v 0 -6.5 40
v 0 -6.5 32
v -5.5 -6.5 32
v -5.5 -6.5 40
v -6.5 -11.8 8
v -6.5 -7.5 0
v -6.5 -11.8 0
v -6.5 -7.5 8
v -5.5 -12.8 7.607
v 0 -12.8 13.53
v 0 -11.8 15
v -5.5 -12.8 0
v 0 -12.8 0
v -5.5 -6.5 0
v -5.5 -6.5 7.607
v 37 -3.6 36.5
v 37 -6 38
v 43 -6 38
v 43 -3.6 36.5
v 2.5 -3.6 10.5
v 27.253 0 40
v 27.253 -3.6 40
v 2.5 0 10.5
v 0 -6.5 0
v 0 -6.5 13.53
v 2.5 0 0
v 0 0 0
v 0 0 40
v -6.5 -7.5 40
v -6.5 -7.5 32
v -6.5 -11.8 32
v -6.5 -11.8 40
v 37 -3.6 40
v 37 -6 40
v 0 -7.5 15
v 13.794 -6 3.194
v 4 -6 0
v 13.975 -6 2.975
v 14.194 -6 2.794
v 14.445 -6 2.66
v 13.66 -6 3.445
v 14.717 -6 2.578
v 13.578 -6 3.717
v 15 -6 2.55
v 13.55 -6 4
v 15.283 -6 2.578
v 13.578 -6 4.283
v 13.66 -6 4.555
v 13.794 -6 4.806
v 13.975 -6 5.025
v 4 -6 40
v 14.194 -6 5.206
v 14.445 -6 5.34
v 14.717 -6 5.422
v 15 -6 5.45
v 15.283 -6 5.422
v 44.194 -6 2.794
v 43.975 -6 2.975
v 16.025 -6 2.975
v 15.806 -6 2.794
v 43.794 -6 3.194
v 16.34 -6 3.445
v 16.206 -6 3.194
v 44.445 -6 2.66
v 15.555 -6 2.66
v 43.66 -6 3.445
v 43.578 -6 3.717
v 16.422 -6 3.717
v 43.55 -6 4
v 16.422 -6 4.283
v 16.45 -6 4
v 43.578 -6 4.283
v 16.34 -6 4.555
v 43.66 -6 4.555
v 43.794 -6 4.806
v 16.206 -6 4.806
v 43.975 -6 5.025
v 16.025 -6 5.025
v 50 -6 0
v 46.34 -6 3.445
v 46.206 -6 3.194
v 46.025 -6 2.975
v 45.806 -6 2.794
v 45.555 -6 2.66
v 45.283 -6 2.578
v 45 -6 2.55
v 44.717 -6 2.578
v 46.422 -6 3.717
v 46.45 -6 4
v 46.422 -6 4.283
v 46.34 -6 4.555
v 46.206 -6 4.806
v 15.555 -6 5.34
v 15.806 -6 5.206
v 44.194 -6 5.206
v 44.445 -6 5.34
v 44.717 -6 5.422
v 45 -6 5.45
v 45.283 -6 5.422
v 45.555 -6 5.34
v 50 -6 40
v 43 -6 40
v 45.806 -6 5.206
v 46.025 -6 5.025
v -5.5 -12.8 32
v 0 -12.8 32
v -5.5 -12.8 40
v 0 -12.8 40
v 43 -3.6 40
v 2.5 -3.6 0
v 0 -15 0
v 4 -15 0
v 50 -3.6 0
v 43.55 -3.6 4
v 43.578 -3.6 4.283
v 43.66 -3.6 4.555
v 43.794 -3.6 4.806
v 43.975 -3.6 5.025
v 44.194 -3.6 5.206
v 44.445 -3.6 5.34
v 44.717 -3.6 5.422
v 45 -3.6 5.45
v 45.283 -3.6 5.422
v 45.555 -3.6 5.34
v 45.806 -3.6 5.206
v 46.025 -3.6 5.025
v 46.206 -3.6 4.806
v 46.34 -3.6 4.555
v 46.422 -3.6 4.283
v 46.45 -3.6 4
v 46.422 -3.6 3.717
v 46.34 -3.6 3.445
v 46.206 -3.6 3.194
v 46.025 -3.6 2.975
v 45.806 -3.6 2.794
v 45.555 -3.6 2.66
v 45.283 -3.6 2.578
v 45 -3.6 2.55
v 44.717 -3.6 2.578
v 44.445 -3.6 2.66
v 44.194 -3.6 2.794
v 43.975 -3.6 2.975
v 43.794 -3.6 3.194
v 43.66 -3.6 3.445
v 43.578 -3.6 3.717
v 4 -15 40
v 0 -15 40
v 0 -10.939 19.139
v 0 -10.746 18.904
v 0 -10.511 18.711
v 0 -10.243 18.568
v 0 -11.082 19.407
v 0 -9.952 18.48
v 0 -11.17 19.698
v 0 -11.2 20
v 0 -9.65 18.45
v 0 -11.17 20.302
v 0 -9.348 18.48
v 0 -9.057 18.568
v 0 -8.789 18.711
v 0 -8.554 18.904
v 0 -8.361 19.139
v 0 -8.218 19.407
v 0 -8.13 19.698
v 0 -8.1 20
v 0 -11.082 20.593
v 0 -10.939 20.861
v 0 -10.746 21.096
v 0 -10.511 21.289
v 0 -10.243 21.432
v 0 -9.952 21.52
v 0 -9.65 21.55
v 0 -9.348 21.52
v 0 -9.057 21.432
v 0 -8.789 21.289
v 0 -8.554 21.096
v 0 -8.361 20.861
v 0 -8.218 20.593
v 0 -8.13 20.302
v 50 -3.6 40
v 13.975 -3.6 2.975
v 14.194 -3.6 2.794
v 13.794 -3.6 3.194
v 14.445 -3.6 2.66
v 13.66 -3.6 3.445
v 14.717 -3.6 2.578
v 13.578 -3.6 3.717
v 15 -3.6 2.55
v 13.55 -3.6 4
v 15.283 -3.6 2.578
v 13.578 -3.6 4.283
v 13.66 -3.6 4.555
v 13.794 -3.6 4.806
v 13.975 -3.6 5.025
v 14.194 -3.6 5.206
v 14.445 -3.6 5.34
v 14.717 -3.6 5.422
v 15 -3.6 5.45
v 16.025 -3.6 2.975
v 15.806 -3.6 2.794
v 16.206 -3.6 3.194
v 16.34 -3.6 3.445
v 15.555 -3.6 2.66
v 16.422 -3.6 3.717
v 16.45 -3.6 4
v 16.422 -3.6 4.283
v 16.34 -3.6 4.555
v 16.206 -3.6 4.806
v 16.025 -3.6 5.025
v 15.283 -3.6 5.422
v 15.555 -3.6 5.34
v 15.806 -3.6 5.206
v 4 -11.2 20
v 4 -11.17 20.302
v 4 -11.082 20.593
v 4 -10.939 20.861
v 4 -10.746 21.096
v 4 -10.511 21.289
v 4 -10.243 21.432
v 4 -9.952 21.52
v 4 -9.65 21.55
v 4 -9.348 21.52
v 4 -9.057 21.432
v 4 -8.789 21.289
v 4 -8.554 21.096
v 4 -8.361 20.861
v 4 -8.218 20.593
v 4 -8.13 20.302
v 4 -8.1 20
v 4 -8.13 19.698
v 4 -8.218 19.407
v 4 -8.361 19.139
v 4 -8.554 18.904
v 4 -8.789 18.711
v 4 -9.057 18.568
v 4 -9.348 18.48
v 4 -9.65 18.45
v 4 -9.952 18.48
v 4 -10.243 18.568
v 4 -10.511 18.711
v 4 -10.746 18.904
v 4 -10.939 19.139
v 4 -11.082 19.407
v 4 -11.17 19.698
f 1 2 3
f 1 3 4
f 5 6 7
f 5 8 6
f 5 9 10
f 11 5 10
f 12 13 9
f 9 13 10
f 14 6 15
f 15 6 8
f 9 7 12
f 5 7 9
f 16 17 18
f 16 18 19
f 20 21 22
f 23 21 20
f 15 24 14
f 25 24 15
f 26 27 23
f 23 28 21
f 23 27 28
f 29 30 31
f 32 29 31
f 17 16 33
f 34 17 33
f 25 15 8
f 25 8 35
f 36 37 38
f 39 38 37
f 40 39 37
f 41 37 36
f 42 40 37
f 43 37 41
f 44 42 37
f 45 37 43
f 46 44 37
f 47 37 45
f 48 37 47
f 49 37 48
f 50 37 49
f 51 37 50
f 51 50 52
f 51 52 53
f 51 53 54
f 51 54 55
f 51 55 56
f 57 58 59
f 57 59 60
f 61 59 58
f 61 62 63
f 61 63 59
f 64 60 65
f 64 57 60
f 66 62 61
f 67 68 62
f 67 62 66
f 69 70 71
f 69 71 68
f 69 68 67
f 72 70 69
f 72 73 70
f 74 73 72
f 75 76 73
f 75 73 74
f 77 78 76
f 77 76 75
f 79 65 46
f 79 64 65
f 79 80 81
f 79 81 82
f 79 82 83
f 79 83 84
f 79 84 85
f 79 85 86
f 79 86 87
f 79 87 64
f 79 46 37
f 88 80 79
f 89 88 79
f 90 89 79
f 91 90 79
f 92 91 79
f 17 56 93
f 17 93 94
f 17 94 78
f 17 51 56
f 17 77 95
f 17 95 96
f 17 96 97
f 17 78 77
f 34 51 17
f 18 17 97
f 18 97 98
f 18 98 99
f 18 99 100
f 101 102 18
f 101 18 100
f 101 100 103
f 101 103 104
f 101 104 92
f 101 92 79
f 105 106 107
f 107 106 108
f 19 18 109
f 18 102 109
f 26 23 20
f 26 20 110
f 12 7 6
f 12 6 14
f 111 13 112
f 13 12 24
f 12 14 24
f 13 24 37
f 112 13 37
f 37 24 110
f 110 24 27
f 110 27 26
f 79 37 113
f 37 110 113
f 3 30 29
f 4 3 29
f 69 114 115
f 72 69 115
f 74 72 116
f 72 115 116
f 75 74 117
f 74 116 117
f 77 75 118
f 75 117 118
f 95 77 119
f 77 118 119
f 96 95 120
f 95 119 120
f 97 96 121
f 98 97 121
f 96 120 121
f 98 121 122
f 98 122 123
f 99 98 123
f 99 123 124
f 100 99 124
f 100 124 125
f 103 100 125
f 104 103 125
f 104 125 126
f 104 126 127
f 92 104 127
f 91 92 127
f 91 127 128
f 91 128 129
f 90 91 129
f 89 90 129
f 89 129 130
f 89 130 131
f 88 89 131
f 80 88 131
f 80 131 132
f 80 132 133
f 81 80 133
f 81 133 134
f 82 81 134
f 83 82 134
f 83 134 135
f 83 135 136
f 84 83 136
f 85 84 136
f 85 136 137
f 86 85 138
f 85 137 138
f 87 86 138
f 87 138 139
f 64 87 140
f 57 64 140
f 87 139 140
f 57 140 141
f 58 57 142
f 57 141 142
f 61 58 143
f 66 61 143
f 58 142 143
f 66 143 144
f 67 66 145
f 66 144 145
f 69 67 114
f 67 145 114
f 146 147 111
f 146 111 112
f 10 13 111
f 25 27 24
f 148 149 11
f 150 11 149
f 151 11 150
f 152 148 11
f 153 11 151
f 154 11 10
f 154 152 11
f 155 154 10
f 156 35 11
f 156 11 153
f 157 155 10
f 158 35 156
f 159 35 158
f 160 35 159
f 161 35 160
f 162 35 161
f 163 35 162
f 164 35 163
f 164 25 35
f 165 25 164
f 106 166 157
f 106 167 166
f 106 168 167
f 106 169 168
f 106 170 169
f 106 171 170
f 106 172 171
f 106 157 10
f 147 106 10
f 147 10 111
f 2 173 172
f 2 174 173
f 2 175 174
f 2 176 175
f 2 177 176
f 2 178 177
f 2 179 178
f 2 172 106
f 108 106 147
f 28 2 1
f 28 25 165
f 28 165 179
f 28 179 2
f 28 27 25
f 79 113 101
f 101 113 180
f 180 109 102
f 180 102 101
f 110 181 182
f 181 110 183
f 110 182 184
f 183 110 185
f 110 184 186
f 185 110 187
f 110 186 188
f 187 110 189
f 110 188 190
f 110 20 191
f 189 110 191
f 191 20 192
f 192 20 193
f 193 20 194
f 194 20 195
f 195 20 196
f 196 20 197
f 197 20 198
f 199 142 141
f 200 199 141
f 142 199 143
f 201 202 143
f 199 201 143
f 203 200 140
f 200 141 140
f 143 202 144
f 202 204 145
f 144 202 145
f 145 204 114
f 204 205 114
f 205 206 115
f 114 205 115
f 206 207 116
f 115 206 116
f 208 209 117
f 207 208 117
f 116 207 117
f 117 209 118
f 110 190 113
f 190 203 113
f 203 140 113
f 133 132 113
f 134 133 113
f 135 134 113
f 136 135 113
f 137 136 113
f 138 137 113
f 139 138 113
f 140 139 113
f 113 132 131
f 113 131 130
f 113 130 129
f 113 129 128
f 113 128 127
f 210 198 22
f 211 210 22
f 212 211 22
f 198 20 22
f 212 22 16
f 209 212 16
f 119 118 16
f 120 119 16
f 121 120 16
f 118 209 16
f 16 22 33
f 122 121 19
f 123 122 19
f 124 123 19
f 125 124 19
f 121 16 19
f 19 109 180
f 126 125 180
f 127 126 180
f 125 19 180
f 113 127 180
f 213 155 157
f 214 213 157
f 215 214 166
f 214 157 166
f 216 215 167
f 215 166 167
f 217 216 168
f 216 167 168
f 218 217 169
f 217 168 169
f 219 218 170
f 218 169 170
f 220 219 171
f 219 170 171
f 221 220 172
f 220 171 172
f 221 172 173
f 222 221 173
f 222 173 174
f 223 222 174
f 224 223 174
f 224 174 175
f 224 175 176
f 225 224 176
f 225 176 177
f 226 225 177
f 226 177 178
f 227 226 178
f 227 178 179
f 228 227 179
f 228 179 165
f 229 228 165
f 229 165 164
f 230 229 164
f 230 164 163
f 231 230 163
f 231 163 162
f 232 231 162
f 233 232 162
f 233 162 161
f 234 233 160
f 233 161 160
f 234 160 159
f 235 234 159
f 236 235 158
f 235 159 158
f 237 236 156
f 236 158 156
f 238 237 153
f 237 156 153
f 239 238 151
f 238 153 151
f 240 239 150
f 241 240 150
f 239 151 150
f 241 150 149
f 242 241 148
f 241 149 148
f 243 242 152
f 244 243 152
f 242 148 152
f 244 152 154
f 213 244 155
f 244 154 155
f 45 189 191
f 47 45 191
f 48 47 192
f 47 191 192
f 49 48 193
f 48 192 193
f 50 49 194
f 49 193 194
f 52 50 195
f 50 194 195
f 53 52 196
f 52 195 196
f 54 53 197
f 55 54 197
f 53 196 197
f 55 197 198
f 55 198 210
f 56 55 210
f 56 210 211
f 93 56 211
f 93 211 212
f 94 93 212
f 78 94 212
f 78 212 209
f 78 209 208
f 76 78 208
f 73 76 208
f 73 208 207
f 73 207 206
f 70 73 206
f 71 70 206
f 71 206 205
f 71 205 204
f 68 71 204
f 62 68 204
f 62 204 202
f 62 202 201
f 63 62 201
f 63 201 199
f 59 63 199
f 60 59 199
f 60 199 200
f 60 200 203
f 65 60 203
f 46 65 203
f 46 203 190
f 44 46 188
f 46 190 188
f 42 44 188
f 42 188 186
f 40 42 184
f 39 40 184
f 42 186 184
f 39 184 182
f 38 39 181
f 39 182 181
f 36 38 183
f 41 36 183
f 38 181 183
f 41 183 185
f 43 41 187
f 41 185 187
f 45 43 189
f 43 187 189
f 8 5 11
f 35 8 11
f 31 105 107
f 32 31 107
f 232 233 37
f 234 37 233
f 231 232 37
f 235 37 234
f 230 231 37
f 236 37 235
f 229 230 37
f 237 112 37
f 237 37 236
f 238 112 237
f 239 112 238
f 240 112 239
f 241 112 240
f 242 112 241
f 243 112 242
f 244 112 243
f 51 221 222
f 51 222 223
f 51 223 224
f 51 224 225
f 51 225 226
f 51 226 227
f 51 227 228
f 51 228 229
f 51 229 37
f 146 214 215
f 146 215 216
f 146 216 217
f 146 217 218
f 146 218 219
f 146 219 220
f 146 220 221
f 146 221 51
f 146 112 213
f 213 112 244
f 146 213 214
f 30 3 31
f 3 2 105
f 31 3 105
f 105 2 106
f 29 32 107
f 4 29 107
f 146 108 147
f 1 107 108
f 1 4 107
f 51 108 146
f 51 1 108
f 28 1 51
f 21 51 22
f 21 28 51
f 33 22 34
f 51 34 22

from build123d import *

# Parameters (mm, degrees)
SKETCH_W        = 50
SKETCH_H        = 40
PAD_DEPTH       = 15
SKETCH001_R     = 1.45
POCKET_DEPTH    = 12
POCKET001_DEPTH = 3.6
SKETCH003_W     = 6
SKETCH003_H     = 2
POCKET002_DEPTH = 15
SKETCH004_W     = 6.3
SKETCH004_H     = 8
PAD001_DEPTH    = 6.5
SKETCH005_W     = 70
SKETCH005_H     = 60
POCKET003_DEPTH = 9
SKETCH006_R     = 1.55
POCKET004_DEPTH = 5
SKETCH018_W     = 3
SKETCH018_H     = 3
POCKET010_DEPTH = 22
POCKET011_DEPTH = 6
PAD007_DEPTH    = 6.3
CHAMFER_SIZE    = 1


with BuildPart() as part:
    # Sketch (on XZ_Plane of Origin) → Pad (new body)
    with BuildSketch(Plane.XZ):
        with Locations((25, 20)):
            Rectangle(SKETCH_W, SKETCH_H)
    extrude(amount=PAD_DEPTH)

    # Sketch001 (on Face5 of Pad) → Pocket (cut)
    with BuildSketch(Plane(origin=(0, 0, 0), x_dir=(-1, 0, 0), z_dir=(0, 1, 0))):
        with Locations((-45, 4)):
            Circle(SKETCH001_R)
        with Locations((-15, 4)):
            Circle(SKETCH001_R)
    extrude(amount=-POCKET_DEPTH, mode=Mode.SUBTRACT)

    # Sketch002 (on Face4 of Pocket) → Pocket001 (cut)
    with BuildSketch(Plane(origin=(0, 0, 0), x_dir=(-1, 0, 0), z_dir=(0, 1, 0))):
        Polygon((-2.5, 0), (-56.5, 0), (-56.5, 40), (-27.253439, 40), (-2.5, 10.5), align=None)
    extrude(amount=-POCKET001_DEPTH, mode=Mode.SUBTRACT)

    # Sketch003 (on Face4 of Pocket001) → Pocket002 (cut)
    with BuildSketch(Plane(origin=(0, 0, 0), x_dir=(-1, 0, 0), z_dir=(0, 1, 0))):
        with Locations((-40, 39)):
            Rectangle(SKETCH003_W, SKETCH003_H)
    extrude(amount=-POCKET002_DEPTH, mode=Mode.SUBTRACT)

    # Sketch004 (on Face1 of Pocket002) → Pad001 (join)
    with BuildSketch(Plane(origin=(0, 0, 0), x_dir=(0, -1, 0), z_dir=(-1, 0, 0))):
        with Locations((9.65, 4)):
            Rectangle(SKETCH004_W, SKETCH004_H)
        with Locations((9.65, 36)):
            Rectangle(SKETCH004_W, SKETCH004_H)
    extrude(amount=PAD001_DEPTH)

    # Sketch005 (on Face6 of Pad001) → Pocket003 (cut)
    with BuildSketch(Plane.XZ.offset(15)):
        with Locations((39, 22)):
            Rectangle(SKETCH005_W, SKETCH005_H)
    extrude(amount=-POCKET003_DEPTH, mode=Mode.SUBTRACT)

    # Sketch006 (on Face1 of Pocket003) → Pocket004 (cut)
    with BuildSketch(Plane(origin=(0, 0, 0), x_dir=(0, -1, 0), z_dir=(-1, 0, 0))):
        with Locations((9.65, 20)):
            Circle(SKETCH006_R)
    extrude(amount=-POCKET004_DEPTH, mode=Mode.SUBTRACT)

    # Sketch018 (on Face21 of Pocket004) → Pocket010 (cut)
    with BuildSketch(Plane.YZ.offset(50)):
        with Locations((-0.3, 38.5)):
            Rectangle(SKETCH018_W, SKETCH018_H)
    extrude(amount=-POCKET010_DEPTH, mode=Mode.SUBTRACT)

    # Sketch019 (on Face15 of Pocket010) → Pocket011 (cut)
    with BuildSketch(Plane.YZ.offset(37)):
        Polygon((-6, 38), (-3.6, 36.5), (-3.6, 38), align=None)
    extrude(amount=POCKET011_DEPTH, mode=Mode.SUBTRACT)

    # Sketch020 (on Face10 of Pocket011) → Pad007 (join)
    with BuildSketch(Plane.XZ.offset(12.8)):
        Polygon((0, 8), (-6.5, 8), (0, 15), align=None)
    extrude(amount=-PAD007_DEPTH)

    # Chamfer
    chamfer_edges = [part.edges().sort_by_distance(p)[0] for p in [
        (-6.5, -12.8, 4),
        (-6.5, -6.5, 4),
        (-6.5, -12.8, 36),
        (-6.5, -6.5, 36),
        (-3.25, -12.8, 11.5),
        (-3.25, -6.5, 11.5),
    ]]
    chamfer(chamfer_edges, length=CHAMFER_SIZE)


solid = part.part
